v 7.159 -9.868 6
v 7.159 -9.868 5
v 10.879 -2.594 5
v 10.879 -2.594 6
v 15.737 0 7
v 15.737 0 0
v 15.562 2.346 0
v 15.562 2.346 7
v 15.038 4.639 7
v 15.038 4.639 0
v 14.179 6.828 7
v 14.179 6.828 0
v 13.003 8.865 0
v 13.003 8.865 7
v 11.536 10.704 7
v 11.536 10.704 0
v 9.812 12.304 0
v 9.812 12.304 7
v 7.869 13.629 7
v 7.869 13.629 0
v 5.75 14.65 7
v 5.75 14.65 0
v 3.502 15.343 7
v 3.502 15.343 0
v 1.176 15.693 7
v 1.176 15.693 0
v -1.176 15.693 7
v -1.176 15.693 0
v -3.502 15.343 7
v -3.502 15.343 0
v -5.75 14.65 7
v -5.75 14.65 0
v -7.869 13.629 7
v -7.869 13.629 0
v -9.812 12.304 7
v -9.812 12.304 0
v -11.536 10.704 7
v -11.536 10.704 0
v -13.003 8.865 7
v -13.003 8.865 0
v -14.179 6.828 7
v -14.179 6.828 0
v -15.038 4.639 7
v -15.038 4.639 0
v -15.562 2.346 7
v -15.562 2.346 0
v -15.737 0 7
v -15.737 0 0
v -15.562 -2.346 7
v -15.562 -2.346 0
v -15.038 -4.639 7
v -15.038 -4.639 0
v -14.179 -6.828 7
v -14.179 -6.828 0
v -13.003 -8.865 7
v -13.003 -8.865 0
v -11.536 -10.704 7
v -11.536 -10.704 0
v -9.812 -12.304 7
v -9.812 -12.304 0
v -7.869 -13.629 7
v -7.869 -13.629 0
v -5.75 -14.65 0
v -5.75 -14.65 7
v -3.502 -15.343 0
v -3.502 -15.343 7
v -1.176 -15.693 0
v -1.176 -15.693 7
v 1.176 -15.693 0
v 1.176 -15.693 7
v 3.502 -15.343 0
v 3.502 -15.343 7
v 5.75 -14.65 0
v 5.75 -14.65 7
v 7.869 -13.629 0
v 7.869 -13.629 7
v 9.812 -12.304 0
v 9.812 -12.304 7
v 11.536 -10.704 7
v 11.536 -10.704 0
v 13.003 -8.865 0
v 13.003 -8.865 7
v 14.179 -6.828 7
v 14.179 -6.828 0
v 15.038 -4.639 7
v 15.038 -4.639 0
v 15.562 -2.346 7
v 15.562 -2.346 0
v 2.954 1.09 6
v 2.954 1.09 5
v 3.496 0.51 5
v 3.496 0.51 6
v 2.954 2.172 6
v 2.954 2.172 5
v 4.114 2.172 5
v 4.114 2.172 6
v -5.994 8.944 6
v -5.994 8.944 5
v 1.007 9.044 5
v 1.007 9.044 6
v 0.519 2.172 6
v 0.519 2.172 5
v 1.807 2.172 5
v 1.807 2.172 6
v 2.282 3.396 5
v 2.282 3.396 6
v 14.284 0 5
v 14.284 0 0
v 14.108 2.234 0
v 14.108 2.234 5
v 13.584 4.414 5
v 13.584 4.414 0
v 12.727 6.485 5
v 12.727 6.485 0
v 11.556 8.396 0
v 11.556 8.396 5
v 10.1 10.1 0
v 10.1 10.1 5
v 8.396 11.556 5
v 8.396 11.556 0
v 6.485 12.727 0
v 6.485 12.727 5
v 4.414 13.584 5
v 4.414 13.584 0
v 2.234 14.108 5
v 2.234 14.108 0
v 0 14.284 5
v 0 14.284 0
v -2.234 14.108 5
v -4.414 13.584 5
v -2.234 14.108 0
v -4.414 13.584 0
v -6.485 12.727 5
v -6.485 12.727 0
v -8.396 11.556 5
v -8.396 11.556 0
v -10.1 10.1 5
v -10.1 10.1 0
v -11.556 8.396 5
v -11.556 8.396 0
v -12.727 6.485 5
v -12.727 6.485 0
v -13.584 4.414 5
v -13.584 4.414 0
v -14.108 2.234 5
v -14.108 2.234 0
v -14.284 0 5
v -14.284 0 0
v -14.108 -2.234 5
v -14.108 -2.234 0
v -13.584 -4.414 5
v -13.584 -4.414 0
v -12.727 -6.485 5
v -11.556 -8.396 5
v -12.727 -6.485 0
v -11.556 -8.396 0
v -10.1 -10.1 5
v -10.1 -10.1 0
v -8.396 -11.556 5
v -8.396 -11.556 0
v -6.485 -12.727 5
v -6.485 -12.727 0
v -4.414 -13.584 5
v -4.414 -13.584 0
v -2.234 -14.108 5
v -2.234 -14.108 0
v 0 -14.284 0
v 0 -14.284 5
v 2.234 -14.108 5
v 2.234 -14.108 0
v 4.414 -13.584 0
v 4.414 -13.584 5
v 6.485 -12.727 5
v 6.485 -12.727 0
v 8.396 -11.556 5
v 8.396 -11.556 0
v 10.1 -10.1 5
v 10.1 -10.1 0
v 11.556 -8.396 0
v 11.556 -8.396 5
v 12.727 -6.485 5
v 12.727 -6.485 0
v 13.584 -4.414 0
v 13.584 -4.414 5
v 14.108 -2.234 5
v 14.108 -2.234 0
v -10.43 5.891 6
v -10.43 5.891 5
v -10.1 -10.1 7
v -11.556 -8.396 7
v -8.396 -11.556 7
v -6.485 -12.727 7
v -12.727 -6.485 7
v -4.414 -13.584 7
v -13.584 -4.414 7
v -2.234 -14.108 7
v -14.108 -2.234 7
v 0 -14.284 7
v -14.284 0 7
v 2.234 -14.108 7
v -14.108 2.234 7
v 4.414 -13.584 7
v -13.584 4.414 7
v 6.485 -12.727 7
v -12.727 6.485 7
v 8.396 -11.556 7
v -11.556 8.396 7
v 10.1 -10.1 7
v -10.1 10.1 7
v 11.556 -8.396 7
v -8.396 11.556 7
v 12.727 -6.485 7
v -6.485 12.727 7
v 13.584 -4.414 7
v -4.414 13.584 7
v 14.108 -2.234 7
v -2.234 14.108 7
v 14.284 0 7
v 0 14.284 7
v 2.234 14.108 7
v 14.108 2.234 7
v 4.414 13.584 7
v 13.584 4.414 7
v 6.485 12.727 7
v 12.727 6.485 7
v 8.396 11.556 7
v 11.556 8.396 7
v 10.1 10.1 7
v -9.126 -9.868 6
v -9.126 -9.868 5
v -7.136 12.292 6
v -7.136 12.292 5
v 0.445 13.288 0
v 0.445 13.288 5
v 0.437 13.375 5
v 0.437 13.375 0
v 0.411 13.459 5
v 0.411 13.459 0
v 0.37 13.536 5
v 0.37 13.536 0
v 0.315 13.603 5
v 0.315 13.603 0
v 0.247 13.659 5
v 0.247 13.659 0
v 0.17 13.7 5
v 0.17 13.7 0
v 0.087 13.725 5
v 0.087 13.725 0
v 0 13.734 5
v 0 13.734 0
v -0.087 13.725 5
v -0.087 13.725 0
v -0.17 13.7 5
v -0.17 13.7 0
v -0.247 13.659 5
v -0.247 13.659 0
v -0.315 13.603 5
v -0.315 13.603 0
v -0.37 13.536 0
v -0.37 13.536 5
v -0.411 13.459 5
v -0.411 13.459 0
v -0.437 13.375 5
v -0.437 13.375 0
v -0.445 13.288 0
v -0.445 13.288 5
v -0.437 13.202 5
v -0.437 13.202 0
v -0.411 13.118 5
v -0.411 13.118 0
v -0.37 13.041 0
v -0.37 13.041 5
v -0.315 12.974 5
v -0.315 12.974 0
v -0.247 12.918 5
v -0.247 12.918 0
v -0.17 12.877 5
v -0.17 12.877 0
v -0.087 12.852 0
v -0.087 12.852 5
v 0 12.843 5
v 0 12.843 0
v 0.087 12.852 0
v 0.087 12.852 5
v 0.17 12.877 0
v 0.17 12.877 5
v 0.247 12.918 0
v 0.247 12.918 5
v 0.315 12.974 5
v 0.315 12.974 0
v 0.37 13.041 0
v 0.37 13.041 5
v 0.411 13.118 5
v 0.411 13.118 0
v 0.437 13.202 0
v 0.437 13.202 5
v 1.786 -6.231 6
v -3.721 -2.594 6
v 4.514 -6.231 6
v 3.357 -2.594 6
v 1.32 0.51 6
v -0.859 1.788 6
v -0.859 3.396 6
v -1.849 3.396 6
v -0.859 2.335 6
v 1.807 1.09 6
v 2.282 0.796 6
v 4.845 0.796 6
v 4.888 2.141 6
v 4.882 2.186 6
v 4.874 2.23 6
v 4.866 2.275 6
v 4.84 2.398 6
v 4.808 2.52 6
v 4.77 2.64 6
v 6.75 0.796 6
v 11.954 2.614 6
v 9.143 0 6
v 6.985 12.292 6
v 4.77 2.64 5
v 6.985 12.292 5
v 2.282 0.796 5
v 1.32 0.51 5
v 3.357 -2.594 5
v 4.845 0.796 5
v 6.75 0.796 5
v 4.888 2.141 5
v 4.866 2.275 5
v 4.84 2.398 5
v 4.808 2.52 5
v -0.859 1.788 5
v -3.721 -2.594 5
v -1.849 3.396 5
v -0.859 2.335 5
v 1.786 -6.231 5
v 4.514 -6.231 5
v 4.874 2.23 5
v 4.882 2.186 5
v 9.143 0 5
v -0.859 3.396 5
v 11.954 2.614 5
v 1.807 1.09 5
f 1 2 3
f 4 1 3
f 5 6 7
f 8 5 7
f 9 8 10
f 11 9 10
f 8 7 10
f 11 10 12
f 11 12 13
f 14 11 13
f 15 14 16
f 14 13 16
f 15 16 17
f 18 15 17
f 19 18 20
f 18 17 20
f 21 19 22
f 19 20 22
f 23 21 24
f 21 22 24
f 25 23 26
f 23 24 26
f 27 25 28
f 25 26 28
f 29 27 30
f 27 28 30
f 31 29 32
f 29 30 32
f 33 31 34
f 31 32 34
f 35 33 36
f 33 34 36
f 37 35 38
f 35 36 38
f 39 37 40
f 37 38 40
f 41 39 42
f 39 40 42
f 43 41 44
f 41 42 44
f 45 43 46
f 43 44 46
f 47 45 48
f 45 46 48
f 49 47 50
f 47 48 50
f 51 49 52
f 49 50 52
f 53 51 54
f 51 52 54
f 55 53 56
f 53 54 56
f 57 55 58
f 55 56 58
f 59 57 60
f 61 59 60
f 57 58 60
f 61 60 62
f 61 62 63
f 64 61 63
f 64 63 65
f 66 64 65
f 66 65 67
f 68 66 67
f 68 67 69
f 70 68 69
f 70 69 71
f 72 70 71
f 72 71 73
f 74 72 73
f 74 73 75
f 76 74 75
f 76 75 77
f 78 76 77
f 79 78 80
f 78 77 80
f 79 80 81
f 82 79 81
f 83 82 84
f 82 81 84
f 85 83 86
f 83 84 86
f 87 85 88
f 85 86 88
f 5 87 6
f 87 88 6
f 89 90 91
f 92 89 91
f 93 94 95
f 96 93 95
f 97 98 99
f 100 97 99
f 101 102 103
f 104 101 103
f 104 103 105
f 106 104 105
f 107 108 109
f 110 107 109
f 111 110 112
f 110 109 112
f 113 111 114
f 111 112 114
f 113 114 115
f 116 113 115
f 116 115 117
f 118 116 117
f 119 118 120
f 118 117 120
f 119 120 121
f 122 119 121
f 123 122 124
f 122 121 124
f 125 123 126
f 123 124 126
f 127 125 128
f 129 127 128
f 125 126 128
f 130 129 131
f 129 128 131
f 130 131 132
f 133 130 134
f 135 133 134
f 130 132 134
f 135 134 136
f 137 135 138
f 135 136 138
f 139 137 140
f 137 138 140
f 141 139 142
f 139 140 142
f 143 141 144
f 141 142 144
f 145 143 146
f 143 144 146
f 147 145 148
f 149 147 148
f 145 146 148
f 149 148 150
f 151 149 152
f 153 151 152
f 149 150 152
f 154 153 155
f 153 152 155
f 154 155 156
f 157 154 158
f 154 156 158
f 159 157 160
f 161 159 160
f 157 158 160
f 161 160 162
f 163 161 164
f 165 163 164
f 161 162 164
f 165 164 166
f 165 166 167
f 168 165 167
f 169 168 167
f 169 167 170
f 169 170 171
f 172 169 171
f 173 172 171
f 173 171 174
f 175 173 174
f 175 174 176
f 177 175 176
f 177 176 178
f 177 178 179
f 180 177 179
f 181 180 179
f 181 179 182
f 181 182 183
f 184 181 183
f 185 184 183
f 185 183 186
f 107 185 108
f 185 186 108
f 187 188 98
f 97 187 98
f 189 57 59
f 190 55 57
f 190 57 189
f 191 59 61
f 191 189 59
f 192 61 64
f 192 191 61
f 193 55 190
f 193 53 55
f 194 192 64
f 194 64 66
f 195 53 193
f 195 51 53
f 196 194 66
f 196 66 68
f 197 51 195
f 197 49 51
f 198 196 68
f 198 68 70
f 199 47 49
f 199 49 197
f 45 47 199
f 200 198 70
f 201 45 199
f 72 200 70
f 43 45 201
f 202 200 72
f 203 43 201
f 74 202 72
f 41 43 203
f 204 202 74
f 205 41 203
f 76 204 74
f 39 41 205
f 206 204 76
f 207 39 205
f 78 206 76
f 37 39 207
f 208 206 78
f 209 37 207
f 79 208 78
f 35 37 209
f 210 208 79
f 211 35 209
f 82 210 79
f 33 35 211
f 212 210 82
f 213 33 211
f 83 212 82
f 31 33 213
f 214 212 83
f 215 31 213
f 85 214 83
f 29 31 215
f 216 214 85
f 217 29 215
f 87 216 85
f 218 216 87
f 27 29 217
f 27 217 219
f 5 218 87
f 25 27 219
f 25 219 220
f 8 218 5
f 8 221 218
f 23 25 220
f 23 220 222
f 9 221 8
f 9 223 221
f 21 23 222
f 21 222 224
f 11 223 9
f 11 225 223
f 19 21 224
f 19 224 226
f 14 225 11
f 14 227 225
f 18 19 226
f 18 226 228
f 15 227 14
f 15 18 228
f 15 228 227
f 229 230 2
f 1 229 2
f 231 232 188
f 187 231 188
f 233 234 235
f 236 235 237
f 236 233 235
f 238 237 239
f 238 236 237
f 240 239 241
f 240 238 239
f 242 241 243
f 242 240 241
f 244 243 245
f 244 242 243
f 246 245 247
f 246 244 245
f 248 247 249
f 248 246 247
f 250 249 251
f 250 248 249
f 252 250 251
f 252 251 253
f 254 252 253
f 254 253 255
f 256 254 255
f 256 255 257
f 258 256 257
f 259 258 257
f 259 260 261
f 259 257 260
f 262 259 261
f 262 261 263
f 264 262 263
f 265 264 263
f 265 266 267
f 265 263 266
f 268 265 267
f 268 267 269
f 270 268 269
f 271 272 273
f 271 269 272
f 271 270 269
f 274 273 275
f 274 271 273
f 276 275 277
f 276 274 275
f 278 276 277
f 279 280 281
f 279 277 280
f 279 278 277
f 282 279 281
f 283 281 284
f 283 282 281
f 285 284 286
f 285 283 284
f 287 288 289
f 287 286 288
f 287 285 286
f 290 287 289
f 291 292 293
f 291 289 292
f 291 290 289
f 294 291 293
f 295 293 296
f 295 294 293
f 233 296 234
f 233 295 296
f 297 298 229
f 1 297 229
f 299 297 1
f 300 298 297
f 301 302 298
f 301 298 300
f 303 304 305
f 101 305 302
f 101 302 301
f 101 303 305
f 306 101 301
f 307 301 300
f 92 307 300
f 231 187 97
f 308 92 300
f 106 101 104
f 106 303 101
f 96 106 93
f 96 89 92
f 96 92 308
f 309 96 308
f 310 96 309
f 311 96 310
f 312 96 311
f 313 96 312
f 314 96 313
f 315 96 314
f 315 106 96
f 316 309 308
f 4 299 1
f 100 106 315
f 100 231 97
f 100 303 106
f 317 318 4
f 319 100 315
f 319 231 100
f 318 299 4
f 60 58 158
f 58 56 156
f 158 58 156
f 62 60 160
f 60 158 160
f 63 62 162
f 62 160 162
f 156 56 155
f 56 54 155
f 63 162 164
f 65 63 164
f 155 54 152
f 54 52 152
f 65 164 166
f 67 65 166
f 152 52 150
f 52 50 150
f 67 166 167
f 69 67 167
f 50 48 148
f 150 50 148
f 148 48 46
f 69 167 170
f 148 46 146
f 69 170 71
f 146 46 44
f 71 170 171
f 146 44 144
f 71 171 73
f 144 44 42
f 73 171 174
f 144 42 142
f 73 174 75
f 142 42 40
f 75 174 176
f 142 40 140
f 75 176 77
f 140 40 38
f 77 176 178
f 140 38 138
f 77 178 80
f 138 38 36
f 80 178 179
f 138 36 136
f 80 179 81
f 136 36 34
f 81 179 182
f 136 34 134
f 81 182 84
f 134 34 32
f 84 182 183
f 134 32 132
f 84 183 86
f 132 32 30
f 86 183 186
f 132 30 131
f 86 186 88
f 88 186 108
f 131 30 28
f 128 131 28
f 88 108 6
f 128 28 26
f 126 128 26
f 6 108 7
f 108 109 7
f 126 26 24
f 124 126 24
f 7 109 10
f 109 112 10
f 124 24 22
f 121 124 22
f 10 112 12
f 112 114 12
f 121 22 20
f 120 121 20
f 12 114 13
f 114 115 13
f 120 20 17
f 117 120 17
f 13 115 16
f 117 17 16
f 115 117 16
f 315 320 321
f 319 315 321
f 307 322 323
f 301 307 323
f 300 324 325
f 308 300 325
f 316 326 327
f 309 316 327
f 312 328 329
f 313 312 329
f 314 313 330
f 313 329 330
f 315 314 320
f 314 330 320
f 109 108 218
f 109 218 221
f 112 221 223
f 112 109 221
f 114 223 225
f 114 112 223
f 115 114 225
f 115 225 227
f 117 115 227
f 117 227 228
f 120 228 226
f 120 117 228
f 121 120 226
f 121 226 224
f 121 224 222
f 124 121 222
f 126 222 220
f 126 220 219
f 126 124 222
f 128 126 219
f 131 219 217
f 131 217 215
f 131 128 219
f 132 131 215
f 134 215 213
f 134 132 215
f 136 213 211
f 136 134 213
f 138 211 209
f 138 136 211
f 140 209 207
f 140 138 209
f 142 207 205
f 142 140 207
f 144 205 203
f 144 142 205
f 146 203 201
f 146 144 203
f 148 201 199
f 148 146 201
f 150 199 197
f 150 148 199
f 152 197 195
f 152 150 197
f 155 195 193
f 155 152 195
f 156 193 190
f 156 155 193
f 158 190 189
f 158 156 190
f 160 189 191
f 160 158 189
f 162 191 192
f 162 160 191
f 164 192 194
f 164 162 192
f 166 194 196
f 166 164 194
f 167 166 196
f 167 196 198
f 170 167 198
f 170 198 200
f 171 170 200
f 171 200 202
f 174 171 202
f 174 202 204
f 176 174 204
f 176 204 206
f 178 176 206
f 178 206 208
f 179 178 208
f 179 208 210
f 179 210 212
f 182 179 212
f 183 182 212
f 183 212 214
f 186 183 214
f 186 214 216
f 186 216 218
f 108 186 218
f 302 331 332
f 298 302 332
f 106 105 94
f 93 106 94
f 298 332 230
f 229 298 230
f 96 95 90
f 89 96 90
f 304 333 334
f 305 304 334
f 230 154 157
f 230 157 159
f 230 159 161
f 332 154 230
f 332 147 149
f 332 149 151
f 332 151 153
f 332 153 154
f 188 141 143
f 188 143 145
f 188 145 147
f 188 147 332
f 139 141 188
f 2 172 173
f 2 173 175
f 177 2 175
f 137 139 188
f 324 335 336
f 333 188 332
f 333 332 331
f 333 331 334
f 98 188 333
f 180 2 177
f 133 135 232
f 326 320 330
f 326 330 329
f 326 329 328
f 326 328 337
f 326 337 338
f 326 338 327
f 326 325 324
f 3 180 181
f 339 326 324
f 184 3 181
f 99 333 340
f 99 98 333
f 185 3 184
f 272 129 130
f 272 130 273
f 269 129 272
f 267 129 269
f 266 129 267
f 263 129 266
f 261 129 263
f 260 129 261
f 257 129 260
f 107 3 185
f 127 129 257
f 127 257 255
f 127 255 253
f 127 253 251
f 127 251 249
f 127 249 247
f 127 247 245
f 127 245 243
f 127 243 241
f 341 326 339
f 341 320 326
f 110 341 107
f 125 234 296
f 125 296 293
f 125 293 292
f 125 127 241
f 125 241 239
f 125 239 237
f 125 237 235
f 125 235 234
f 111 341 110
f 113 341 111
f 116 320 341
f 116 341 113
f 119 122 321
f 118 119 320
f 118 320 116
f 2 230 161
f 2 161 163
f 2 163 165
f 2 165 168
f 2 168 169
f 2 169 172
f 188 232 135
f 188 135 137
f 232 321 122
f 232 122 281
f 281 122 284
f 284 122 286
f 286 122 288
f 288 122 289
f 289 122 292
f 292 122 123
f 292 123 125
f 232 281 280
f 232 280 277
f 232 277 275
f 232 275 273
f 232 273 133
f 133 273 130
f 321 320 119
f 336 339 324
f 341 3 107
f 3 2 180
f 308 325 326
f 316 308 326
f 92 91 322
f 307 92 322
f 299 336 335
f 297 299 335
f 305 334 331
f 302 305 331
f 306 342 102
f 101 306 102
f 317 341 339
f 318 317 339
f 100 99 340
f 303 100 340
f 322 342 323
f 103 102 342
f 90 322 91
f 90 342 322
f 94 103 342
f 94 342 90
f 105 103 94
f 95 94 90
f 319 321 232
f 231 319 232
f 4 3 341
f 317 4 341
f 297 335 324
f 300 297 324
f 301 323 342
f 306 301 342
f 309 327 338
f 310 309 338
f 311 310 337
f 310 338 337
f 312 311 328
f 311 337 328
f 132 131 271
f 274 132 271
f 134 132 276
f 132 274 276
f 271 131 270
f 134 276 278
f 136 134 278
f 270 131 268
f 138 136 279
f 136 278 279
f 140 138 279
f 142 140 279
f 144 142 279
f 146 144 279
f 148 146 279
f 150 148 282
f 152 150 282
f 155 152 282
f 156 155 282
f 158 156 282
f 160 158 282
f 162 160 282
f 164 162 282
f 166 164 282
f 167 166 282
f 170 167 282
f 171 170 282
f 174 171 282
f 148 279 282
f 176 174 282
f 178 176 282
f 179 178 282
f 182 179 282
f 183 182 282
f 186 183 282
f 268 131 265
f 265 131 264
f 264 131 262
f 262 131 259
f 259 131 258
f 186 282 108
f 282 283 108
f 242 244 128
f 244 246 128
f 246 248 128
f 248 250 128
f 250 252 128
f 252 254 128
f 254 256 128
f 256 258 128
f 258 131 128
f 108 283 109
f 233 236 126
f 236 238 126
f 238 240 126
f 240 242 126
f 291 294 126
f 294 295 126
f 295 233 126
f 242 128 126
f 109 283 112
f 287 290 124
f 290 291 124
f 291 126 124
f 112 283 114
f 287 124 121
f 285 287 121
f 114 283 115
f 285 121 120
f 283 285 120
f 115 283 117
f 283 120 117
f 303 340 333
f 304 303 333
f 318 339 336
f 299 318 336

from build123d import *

# Parameters (mm, degrees)
F0_R     = 15.737452
F0_R_2   = 14.283509
F1_DEPTH = 7
F2_DEPTH = 5
F4_DEPTH = 6
F5_R     = 0.445192
F6_DEPTH = 57


with BuildPart() as f1:
    # F0 (on Top) → F1 (new body)
    with BuildSketch(Plane.XY):
        Circle(F0_R)
        Circle(F0_R_2, mode=Mode.SUBTRACT)
    extrude(amount=F1_DEPTH)


with BuildPart() as f2:
    # F0 (on Top) → F2 (new body)
    with BuildSketch(Plane.XY):
        Circle(F0_R_2)
    extrude(amount=F2_DEPTH)

    # F3 (on Top) → F4 (join)
    with BuildSketch(Plane.XY):
        with BuildLine():
            Line((-3.721197, -2.593628), (-9.12579, -9.868134))
            Line((-9.12579, -9.868134), (7.159184, -9.868134))
            Line((7.159184, -9.868134), (10.879102, -2.593628))
            Line((10.879102, -2.593628), (11.953744, 2.614258))
            Line((11.953744, 2.614258), (9.143141, 0))
            Line((9.143141, 0), (4.51391, -6.230881))
            Line((4.51391, -6.230881), (1.785969, -6.230881))
            Line((1.785969, -6.230881), (3.356602, -2.593628))
            Line((3.356602, -2.593628), (4.844569, 0.795631))
            Line((4.844569, 0.795631), (6.749675, 0.795631))
            Line((6.749675, 0.795631), (4.888051, 2.140685))
            ThreePointArc((4.888051, 2.140685), (4.905901, 1.964548), (4.91186, 1.787609))
            ThreePointArc((4.91186, 1.787609), (2.281958, -0.842292), (-0.347943, 1.787609))
            Line((-0.347943, 1.787609), (-0.859305, 2.335319))
            Line((-0.859305, 2.335319), (-0.859305, 1.787609))
            Line((-0.859305, 1.787609), (-3.721197, -2.593628))
        make_face()
        with BuildLine():
            Line((-1.849496, 3.395893), (-0.859305, 2.335319))
            Line((-0.859305, 2.335319), (-0.347943, 1.787609))
            ThreePointArc((-0.347943, 1.787609), (1.849861, 4.381771), (4.769871, 2.64006))
            Line((4.769871, 2.64006), (6.985019, 12.291914))
            Line((6.985019, 12.291914), (5.902433, 12.291914))
            Line((5.902433, 12.291914), (-6.335478, 12.291914))
            Line((-6.335478, 12.291914), (-7.13565, 12.291914))
            Line((-7.13565, 12.291914), (-10.430472, 5.890545))
            Line((-10.430472, 5.890545), (-5.993844, 8.943698))
            Line((-5.993844, 8.943698), (1.007269, 9.044161))
            Line((1.007269, 9.044161), (-0.859305, 3.395893))
            Line((-0.859305, 3.395893), (-1.849496, 3.395893))
        make_face()
        with BuildLine():
            ThreePointArc((4.769871, 2.64006), (1.849861, 4.381771), (-0.347943, 1.787609))
            ThreePointArc((-0.347943, 1.787609), (2.281958, -0.842292), (4.91186, 1.787609))
            ThreePointArc((4.91186, 1.787609), (4.905901, 1.964548), (4.888051, 2.140685))
            Line((4.888051, 2.140685), (4.844569, 2.172102))
            Line((4.844569, 2.172102), (4.866317, 2.274924))
            ThreePointArc((4.866317, 2.274924), (4.824657, 2.459225), (4.769871, 2.64006))
        make_face()
        Polygon((1.320209, 0.509559), (1.80744, 1.089517), (0.518823, 2.172102), (1.80744, 2.172102), (2.281958, 3.395893), (2.95428, 2.172102), (4.113815, 2.172102), (2.95428, 1.089517), (3.495751, 0.509559), (2.281958, 0.795631), align=None, mode=Mode.SUBTRACT)
        with BuildLine():
            ThreePointArc((4.888051, 2.140685), (4.878052, 2.207945), (4.866317, 2.274924))
            Line((4.866317, 2.274924), (4.844569, 2.172102))
            Line((4.844569, 2.172102), (4.888051, 2.140685))
        make_face()
    extrude(amount=F4_DEPTH)

    # F5 (on Top) → F6 (cut)
    with BuildSketch(Plane.XY):
        with Locations((0, 13.288498)):
            Circle(F5_R)
    extrude(amount=F6_DEPTH, mode=Mode.SUBTRACT)


solid = Compound([f1.part, f2.part])
